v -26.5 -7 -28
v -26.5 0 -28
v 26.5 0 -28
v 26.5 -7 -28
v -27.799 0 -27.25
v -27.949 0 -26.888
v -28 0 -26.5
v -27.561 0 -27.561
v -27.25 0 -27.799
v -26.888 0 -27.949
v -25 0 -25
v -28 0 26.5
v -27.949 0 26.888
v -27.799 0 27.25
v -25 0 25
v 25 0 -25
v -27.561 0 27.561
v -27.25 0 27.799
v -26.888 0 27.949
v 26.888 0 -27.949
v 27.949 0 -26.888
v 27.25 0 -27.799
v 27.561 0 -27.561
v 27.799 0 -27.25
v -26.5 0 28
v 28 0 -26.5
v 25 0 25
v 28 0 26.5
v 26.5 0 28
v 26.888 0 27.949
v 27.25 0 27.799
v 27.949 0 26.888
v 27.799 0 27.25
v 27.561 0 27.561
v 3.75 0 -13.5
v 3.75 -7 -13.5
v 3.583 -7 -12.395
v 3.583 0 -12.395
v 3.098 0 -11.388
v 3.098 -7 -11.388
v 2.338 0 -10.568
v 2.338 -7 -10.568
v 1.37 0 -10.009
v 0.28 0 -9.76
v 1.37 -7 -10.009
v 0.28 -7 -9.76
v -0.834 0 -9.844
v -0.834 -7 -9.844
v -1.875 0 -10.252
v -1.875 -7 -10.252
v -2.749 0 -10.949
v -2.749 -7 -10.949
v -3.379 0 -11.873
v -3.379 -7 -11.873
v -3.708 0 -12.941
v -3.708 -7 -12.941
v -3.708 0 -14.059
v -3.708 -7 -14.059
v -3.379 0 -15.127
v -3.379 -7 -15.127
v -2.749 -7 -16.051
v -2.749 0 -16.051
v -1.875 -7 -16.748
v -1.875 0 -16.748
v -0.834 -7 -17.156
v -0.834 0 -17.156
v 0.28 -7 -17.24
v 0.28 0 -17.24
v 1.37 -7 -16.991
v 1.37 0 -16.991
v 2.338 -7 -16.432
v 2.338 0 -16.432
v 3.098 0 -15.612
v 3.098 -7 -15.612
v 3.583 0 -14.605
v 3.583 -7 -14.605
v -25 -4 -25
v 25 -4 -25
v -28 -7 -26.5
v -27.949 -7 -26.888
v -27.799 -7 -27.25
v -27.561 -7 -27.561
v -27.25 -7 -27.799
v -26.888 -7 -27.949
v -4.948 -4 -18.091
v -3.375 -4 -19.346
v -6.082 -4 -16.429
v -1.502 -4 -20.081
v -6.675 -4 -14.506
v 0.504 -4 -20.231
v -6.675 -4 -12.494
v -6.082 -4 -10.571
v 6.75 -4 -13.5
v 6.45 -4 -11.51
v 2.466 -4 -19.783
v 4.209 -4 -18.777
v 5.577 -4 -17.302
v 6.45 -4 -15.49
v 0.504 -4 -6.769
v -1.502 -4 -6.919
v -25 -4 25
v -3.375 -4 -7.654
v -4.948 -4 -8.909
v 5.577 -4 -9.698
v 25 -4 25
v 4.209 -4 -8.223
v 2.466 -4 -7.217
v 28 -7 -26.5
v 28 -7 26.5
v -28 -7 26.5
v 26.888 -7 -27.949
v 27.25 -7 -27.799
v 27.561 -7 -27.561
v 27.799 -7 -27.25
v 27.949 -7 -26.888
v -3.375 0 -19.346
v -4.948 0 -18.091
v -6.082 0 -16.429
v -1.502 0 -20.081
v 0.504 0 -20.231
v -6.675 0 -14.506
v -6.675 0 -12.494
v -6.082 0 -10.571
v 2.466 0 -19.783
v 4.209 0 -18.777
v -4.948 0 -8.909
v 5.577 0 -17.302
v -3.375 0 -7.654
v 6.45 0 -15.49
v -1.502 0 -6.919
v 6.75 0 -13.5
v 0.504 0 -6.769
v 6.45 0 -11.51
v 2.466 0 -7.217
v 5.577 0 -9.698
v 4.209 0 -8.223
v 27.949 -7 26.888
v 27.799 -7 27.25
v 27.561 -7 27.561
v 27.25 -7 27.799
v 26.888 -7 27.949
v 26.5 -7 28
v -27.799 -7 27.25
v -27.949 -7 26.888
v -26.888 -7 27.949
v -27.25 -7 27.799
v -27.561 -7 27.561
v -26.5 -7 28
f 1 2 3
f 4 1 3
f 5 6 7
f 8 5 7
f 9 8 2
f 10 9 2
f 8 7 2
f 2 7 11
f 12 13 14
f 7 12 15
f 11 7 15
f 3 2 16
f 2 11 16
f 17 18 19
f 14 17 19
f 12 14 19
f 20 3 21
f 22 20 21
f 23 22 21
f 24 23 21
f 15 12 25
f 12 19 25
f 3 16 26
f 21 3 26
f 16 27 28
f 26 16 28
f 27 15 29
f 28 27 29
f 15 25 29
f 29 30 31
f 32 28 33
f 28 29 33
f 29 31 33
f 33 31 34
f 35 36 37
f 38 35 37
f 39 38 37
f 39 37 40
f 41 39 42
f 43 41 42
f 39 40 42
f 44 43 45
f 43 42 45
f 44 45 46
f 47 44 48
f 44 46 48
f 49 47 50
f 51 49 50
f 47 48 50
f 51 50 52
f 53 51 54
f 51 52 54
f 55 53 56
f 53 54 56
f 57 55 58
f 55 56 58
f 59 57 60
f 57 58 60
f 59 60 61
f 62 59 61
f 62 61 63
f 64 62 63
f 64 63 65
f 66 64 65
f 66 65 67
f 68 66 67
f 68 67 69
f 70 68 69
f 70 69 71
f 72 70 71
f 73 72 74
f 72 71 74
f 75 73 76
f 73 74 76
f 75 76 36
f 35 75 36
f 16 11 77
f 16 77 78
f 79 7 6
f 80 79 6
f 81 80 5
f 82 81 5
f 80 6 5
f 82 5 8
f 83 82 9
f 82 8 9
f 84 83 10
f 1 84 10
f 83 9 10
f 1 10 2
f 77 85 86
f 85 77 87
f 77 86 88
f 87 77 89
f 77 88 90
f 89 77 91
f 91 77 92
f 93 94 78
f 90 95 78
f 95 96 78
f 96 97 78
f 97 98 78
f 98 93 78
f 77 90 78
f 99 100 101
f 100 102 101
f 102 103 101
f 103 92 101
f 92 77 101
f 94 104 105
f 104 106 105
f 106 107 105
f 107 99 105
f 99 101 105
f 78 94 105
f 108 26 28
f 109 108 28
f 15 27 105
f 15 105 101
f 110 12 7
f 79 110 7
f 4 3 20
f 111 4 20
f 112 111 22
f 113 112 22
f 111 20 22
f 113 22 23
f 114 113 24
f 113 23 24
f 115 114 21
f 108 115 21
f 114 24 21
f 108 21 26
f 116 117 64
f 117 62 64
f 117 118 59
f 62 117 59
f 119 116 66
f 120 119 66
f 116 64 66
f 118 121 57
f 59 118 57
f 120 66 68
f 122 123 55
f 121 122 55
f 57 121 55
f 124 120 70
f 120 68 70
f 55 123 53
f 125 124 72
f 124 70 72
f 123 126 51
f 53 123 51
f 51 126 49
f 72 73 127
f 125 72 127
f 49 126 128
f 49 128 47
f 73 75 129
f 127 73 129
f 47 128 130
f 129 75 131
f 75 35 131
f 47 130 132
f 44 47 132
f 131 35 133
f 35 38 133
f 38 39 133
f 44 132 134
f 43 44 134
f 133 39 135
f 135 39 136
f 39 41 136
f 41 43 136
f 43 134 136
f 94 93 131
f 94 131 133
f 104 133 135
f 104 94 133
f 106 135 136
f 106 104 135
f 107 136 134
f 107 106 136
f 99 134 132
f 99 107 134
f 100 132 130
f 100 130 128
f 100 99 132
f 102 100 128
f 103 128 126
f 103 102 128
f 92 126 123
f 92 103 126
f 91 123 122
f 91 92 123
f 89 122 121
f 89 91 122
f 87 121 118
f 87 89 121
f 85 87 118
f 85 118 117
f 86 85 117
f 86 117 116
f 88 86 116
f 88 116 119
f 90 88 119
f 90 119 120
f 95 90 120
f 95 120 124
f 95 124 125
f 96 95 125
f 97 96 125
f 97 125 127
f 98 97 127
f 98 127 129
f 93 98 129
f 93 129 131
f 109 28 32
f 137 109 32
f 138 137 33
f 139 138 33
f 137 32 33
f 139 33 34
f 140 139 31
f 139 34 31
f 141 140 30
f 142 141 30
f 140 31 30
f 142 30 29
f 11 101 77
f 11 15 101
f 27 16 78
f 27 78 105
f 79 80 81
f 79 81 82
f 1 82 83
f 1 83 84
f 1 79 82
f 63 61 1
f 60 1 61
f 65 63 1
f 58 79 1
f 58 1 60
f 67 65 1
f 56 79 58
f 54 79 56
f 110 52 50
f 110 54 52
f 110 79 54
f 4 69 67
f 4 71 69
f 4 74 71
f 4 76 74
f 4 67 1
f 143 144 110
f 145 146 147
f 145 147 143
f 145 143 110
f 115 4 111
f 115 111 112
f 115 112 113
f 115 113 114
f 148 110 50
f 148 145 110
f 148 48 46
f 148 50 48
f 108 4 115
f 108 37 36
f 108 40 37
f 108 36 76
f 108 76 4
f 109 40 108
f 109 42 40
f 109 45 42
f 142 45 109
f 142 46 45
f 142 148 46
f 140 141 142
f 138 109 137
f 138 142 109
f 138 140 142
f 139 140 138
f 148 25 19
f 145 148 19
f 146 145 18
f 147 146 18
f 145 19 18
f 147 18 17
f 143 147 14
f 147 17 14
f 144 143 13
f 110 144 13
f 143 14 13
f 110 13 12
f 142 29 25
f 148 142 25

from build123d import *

# Parameters (mm, degrees)
F1_DEPTH = 7
F2_R     = 3.75
F3_DEPTH = 7
F4_T     = -3


with BuildPart() as f1:
    # F0 (on Front) → F1 (new body)
    with BuildSketch(Plane.XZ):
        with BuildLine():
            ThreePointArc((28, 26.5), (27.56066, 27.56066), (26.5, 28))
            Line((26.5, 28), (-26.5, 28))
            ThreePointArc((-26.5, 28), (-27.56066, 27.56066), (-28, 26.5))
            Line((-28, 26.5), (-28, -26.5))
            ThreePointArc((-28, -26.5), (-27.56066, -27.56066), (-26.5, -28))
            Line((-26.5, -28), (26.5, -28))
            ThreePointArc((26.5, -28), (27.56066, -27.56066), (28, -26.5))
            Line((28, -26.5), (28, 26.5))
        make_face()
    extrude(amount=F1_DEPTH)

    # F2 (on face) → F3 (cut)
    with BuildSketch(Plane.XZ.offset(7)):
        with Locations((0, -13.5)):
            Circle(F2_R)
    extrude(amount=-F3_DEPTH, mode=Mode.SUBTRACT)

    # F4
    f4_openings = [f1.faces().sort_by_distance(p)[0] for p in [
        (0, 0, 0.19302),
    ]]
    offset(amount=F4_T, openings=f4_openings)


solid = f1.part
